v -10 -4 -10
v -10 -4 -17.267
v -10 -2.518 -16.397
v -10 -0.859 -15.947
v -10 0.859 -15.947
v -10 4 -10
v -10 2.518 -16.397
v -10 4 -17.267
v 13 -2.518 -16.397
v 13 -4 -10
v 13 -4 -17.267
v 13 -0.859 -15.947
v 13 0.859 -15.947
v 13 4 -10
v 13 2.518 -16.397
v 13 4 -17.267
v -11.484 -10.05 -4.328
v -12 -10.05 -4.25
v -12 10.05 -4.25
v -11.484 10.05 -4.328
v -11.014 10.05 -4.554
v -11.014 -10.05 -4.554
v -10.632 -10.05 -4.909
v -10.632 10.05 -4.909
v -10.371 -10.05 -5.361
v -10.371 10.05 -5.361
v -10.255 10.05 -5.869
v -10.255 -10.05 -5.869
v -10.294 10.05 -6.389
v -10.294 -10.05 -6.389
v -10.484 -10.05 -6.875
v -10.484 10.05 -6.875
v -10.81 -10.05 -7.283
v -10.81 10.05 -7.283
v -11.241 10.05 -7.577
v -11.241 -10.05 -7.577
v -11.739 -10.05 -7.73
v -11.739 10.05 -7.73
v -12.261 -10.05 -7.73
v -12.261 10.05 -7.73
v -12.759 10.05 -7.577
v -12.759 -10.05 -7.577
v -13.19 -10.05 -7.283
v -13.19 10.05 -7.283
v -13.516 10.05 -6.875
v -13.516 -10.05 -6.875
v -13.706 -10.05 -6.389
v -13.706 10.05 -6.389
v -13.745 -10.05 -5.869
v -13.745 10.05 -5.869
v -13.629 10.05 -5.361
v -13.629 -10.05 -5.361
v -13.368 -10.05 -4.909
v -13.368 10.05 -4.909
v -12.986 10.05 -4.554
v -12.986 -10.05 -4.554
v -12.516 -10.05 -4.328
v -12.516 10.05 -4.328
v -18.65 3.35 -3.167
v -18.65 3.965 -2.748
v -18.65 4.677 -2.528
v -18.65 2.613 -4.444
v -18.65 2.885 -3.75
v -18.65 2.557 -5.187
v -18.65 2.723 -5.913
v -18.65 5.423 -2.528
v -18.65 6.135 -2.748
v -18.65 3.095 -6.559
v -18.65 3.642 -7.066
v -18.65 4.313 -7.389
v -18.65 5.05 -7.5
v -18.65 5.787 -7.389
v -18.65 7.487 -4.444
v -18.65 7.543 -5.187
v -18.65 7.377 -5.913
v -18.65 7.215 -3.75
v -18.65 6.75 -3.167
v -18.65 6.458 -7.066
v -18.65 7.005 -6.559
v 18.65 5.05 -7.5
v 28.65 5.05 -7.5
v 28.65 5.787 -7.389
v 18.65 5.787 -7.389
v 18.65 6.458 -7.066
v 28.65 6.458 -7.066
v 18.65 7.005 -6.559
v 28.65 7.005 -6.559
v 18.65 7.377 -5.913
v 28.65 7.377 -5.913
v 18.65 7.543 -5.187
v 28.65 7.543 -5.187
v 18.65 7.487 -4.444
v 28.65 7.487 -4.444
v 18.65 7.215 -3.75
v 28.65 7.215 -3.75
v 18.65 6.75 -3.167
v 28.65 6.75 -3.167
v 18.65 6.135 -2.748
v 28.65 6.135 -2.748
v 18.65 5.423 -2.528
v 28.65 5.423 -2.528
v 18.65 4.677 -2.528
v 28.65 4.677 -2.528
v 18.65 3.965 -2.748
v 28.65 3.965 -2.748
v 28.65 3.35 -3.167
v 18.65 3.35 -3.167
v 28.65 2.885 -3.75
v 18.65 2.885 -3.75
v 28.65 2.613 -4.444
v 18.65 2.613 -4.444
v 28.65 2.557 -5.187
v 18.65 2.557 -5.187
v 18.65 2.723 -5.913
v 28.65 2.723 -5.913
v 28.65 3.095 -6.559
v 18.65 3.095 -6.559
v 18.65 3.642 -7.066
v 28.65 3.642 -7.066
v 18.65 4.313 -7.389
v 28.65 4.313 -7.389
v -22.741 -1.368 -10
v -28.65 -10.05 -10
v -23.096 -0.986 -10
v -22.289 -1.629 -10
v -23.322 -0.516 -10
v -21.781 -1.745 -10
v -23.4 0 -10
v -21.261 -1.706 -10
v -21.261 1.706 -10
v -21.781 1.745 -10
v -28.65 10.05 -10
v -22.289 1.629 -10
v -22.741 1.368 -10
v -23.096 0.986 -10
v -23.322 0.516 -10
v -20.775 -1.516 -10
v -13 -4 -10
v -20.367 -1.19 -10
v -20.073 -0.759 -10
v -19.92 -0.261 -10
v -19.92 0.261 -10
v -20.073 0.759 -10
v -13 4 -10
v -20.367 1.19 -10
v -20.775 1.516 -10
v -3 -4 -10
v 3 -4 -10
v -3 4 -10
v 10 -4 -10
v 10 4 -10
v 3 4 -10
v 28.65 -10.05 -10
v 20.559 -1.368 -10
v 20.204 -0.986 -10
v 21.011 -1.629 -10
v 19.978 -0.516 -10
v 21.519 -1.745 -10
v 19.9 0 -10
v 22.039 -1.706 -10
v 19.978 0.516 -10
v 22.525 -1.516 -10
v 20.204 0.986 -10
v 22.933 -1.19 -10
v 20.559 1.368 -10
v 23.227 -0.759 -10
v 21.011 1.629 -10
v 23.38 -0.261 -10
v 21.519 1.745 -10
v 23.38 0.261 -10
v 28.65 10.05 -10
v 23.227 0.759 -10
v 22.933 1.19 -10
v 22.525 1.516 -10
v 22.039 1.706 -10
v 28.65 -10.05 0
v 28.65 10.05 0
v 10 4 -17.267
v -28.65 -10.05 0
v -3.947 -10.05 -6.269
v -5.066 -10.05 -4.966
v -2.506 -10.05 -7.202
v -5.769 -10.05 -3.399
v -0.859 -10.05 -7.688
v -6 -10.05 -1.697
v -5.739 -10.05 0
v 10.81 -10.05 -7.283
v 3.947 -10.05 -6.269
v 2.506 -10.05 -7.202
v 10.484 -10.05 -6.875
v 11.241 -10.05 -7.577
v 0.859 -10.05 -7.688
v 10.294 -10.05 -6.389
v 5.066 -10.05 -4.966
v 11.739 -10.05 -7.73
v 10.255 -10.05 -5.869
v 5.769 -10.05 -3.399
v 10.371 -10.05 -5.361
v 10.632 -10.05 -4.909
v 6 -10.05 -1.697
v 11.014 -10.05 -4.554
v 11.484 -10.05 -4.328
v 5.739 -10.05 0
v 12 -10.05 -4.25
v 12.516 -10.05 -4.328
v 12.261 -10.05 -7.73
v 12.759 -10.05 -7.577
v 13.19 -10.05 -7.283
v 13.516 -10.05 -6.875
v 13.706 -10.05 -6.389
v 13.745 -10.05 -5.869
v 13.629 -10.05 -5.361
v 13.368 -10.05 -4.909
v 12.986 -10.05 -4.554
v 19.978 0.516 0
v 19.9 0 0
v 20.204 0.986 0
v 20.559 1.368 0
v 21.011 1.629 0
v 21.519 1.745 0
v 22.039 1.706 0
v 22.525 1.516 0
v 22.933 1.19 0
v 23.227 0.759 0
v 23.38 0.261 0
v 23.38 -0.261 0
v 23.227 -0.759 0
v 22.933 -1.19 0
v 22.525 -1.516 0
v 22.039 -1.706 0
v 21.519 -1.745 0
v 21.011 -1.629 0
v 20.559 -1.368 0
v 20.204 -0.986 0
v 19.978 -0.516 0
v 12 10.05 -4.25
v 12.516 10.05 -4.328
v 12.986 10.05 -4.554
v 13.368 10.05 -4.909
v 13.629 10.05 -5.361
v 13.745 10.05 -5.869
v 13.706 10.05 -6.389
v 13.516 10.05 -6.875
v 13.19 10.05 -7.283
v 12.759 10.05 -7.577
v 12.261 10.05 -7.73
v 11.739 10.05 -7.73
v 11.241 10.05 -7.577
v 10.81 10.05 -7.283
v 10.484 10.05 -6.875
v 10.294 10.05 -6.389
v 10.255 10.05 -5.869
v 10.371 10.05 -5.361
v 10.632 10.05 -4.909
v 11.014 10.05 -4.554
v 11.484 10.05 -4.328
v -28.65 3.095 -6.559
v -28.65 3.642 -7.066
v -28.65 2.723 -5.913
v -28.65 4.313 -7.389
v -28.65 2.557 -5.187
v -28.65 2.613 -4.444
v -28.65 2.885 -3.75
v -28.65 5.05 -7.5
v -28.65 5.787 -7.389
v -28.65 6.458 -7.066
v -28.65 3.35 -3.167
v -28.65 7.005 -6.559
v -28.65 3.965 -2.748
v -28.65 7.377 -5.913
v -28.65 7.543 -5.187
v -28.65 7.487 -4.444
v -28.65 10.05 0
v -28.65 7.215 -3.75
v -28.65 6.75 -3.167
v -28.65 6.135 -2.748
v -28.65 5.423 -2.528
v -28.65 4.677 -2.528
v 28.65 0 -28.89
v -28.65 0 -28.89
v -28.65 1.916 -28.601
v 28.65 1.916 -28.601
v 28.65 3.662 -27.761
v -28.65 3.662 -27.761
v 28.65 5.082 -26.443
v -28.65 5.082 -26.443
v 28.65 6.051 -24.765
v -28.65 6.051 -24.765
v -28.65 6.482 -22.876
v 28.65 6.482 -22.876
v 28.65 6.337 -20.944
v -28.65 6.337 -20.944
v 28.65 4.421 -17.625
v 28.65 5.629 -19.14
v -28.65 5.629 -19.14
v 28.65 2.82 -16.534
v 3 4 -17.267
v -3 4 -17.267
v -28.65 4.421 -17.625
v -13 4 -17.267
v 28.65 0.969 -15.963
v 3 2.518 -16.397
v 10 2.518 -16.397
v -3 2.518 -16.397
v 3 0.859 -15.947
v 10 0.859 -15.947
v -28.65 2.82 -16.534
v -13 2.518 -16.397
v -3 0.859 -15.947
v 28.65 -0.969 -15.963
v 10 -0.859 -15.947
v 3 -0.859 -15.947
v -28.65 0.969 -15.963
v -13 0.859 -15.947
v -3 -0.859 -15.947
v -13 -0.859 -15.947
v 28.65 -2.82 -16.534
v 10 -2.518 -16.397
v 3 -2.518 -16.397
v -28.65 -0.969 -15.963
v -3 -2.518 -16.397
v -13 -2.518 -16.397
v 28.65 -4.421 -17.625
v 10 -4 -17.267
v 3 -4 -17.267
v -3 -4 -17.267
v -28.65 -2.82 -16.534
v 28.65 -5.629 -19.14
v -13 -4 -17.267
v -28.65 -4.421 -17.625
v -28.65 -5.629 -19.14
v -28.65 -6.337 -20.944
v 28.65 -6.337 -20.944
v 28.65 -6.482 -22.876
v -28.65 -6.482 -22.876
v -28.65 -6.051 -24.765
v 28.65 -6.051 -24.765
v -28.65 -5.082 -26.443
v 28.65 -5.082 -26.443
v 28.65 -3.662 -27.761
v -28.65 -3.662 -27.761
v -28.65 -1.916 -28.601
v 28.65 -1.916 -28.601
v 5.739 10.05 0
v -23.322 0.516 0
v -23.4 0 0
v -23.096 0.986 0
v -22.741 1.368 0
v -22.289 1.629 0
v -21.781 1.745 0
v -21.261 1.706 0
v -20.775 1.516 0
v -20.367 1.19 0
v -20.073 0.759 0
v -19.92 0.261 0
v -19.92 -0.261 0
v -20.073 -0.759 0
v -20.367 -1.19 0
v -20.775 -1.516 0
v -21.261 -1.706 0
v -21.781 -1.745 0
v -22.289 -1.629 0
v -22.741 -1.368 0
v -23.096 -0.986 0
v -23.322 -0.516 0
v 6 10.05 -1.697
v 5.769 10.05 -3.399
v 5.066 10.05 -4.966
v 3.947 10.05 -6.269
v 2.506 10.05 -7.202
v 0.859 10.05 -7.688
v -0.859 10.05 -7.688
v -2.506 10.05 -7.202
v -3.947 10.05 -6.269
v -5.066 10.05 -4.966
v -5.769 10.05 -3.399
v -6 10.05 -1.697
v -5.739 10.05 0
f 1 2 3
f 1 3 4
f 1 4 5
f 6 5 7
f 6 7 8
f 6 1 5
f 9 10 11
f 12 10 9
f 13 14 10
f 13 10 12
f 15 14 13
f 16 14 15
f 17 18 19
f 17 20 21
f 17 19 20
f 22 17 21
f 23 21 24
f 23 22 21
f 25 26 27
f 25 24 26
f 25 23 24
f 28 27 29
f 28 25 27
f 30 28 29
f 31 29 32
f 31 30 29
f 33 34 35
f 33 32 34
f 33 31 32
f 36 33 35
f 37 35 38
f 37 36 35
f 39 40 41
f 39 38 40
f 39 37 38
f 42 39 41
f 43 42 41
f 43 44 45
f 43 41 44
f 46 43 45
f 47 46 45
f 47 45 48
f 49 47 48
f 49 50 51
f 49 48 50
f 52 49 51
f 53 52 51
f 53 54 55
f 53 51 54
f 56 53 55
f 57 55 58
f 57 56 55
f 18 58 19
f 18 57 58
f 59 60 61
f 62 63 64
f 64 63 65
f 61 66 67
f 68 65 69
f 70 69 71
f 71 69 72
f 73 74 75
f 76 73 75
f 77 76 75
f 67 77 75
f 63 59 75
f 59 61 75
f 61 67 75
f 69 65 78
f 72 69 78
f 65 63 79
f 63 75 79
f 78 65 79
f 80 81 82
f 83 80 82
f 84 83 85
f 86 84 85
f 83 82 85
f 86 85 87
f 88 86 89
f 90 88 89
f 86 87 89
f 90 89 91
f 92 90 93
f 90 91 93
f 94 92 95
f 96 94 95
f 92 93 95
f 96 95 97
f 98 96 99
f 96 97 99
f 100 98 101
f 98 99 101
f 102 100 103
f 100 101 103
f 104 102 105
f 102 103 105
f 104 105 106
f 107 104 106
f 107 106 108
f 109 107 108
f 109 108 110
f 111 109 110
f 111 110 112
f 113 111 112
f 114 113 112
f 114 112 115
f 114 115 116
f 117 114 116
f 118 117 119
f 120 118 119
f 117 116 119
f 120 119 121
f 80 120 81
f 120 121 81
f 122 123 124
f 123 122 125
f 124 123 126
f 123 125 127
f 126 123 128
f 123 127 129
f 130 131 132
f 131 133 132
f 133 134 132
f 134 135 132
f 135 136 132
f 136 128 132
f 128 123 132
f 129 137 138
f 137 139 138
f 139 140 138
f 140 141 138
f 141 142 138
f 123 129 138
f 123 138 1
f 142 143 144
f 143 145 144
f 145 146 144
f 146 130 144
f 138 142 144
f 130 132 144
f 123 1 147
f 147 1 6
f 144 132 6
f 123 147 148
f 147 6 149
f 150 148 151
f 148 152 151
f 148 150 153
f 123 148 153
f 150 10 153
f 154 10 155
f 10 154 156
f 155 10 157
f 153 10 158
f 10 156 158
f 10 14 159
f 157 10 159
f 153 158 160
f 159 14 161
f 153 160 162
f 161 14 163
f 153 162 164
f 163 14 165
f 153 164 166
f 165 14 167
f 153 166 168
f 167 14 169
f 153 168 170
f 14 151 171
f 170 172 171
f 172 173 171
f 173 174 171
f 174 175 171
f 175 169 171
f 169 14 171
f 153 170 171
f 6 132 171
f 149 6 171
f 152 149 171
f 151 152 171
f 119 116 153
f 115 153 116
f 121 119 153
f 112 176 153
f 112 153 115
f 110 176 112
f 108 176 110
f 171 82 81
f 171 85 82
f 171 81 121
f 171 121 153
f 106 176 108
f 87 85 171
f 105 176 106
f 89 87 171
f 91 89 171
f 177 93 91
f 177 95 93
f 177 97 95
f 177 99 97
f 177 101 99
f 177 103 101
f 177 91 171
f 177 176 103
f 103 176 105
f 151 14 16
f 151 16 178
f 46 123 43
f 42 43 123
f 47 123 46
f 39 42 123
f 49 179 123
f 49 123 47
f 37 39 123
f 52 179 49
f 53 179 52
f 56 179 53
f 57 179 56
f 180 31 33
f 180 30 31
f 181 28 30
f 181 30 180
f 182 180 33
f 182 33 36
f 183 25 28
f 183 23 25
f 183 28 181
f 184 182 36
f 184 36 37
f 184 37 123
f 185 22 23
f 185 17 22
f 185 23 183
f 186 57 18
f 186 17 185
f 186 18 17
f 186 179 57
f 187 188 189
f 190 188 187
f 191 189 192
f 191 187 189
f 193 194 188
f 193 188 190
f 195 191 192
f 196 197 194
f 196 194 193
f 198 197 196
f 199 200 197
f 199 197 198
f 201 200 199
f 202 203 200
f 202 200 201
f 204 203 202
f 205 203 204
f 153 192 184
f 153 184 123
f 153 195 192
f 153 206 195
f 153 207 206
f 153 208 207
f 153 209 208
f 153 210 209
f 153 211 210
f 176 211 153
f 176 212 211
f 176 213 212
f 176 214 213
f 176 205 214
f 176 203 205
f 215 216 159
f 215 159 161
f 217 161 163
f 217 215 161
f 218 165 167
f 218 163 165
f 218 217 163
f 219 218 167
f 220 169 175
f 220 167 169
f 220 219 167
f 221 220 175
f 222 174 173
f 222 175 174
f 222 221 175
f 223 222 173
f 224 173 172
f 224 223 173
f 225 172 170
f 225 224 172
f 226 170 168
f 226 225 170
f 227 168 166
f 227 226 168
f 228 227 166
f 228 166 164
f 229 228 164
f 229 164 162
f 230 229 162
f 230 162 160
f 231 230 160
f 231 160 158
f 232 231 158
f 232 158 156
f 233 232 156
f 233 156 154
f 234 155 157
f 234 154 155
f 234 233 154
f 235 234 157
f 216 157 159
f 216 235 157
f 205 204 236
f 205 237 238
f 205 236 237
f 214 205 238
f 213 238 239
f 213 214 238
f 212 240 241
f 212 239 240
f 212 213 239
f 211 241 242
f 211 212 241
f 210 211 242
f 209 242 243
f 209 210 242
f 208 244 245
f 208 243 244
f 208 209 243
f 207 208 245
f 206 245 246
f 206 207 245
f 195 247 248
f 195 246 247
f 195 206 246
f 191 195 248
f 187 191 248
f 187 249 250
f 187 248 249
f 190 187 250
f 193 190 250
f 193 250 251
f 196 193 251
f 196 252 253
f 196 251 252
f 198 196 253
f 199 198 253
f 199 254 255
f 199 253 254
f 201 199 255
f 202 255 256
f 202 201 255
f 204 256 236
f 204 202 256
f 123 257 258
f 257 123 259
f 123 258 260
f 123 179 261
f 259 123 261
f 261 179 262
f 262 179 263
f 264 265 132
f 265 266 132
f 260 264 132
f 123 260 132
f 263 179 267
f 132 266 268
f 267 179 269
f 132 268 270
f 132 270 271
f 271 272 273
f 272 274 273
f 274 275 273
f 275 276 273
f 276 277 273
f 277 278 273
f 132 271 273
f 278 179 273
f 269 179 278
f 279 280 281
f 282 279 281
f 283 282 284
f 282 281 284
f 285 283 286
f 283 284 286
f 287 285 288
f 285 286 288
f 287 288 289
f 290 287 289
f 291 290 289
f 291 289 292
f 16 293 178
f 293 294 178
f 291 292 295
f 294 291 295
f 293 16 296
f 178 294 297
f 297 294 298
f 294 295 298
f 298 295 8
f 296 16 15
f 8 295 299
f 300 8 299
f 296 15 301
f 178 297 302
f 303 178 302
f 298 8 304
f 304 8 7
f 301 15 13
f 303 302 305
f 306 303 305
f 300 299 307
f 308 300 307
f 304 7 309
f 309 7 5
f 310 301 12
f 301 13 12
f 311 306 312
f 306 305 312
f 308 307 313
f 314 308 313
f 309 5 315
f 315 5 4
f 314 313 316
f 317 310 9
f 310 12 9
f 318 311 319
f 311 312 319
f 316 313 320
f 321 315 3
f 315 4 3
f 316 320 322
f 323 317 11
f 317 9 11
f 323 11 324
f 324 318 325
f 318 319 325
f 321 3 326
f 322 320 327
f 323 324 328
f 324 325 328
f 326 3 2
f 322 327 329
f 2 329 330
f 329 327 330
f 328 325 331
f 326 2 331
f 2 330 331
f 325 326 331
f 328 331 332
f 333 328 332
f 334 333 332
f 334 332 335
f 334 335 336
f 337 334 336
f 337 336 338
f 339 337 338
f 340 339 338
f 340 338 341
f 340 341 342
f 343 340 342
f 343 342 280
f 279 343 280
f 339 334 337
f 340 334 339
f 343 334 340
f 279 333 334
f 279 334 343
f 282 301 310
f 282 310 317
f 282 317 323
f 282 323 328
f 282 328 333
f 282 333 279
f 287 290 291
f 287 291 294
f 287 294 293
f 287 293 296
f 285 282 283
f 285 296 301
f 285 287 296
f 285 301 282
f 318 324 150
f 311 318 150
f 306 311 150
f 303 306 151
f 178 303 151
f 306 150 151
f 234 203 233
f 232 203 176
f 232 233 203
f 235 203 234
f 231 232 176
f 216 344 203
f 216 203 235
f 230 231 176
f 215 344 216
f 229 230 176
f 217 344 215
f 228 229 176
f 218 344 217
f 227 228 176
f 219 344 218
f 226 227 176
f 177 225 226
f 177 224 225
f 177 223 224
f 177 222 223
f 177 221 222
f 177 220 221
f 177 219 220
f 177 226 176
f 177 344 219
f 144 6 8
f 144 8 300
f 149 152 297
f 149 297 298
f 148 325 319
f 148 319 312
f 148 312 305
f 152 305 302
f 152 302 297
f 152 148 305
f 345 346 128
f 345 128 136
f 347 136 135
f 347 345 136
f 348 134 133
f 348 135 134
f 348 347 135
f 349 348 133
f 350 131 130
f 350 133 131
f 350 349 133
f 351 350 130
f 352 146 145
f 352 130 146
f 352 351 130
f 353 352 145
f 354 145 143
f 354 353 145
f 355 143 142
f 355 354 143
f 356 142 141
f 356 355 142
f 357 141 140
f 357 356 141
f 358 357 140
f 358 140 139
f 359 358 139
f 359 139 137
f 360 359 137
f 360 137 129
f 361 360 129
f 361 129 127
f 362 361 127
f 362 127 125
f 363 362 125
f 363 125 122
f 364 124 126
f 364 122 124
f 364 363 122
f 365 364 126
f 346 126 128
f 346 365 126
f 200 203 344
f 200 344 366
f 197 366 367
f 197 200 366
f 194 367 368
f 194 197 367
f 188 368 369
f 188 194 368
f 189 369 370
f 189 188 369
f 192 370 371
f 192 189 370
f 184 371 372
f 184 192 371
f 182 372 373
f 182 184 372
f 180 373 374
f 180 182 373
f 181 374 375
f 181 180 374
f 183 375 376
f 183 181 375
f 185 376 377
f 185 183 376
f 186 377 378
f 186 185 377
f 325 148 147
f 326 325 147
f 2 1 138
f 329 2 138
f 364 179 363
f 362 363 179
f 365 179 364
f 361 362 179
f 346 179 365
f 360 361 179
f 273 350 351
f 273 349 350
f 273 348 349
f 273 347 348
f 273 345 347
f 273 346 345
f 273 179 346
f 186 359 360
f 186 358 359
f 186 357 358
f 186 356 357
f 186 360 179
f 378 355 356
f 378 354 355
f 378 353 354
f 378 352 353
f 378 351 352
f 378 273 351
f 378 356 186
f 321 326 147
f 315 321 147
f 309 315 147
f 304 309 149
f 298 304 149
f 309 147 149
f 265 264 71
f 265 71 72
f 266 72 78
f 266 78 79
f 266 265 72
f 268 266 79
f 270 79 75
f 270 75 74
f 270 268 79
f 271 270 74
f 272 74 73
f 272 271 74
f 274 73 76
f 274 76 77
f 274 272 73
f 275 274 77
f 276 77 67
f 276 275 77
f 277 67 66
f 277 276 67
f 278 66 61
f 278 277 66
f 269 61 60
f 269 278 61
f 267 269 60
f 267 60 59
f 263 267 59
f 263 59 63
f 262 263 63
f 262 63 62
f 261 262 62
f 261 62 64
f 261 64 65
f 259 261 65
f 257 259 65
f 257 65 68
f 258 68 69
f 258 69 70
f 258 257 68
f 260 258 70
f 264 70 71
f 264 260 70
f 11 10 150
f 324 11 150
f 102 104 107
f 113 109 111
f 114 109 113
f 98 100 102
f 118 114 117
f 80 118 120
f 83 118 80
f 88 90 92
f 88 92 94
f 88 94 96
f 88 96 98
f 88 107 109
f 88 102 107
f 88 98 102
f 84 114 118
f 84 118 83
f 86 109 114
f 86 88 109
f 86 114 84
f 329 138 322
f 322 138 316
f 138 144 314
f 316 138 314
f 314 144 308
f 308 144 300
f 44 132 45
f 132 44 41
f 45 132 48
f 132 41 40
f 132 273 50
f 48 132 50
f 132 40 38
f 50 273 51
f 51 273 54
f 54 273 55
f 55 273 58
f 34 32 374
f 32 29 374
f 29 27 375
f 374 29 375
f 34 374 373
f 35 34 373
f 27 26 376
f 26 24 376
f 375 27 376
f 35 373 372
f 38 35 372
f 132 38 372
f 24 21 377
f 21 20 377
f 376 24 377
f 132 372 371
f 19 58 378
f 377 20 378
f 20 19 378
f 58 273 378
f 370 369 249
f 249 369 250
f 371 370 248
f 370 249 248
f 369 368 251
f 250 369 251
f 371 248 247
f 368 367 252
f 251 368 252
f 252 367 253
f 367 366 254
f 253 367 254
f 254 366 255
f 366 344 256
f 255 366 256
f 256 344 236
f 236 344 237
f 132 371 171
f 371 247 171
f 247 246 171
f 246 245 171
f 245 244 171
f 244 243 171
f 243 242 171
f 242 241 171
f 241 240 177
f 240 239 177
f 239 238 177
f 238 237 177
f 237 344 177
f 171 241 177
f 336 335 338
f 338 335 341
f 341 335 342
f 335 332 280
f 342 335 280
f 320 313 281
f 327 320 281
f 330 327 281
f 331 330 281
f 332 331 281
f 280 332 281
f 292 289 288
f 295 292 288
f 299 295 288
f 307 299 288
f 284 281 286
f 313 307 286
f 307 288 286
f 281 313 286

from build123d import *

# Parameters (mm, degrees)
SKETCH1_W                = 57.3
SKETCH1_H                = 20.1
BOSS_EXTRUDE1_DEPTH      = 10
SKETCH2_W                = 3
SKETCH2_H                = 8
SKETCH2_W_2              = 6
BOSS_EXTRUDE2_DEPTH      = 20
SKETCH3_R                = 2.5
SKETCH3_R_2              = 1.75
BOSS_EXTRUDE3_DEPTH      = 4
BOSS_EXTRUDE4_START      = -9
SKETCH3_3_R              = 2.5
SKETCH3_3_R_2            = 1.75
BOSS_EXTRUDE4_DEPTH      = 8
CUT_EXTRUDE1_DEPTH       = 53.304158534
CUT_EXTRUDE1_DEPTH_BACK  = 53.304158534
SKETCH3_4_R              = 1.75
CUT_EXTRUDE2_DEPTH       = 35.503001319
CUT_EXTRUDE2_DEPTH_BACK  = 35.503001319
SKETCH4_R                = 1.75
CUT_EXTRUDE3_DEPTH       = 44.832232432
CUT_EXTRUDE3_DEPTH_BACK  = 44.832232432
SKETCH6_R                = 1.75
SKETCH6_R_2              = 6
SKETCH7_R                = 2.5
CUT_EXTRUDE4_DEPTH       = 10
BOSS_EXTRUDE6_DEPTH      = 15.65
BOSS_EXTRUDE6_DEPTH_BACK = 41.65
SKETCH5_R                = 6.5


with BuildPart() as part:
    # Sketch1 → Boss-Extrude1 (new body)
    with BuildSketch(Plane.XY):
        Rectangle(SKETCH1_W, SKETCH1_H)
    extrude(amount=-BOSS_EXTRUDE1_DEPTH)

    # Sketch2 → Boss-Extrude2 (add)
    with BuildSketch(Plane(origin=(0, 0, -10), x_dir=(-1, 0, 0), z_dir=(0, 0, -1))):
        with Locations((-11.5, 0)):
            Rectangle(SKETCH2_W, SKETCH2_H)
        Rectangle(SKETCH2_W_2, SKETCH2_H)
        with Locations((11.5, 0)):
            Rectangle(SKETCH2_W, SKETCH2_H)
    extrude(amount=BOSS_EXTRUDE2_DEPTH)

    # Sketch3 → Boss-Extrude3 (add)
    with BuildSketch(Plane(origin=(13, 0, 0), x_dir=(0, 0, -1), z_dir=(1, 0, 0))):
        with Locations((22.39, 0)):
            Circle(SKETCH3_R)
        with Locations((22.39, 0)):
            Circle(SKETCH3_R_2, mode=Mode.SUBTRACT)
    boss_extrude3 = extrude(amount=-BOSS_EXTRUDE3_DEPTH)

    # Sketch3<3> → Boss-Extrude4 (add)
    with BuildSketch(Plane(origin=(13, 0, 0), x_dir=(0, 0, -1), z_dir=(1, 0, 0)).offset(BOSS_EXTRUDE4_START)):
        with Locations((22.39, 0)):
            Circle(SKETCH3_3_R)
        with Locations((22.39, 0)):
            Circle(SKETCH3_3_R_2, mode=Mode.SUBTRACT)
    extrude(amount=-BOSS_EXTRUDE4_DEPTH)

    # Mirror1: Boss-Extrude3 across plane
    add(boss_extrude3.mirror(Plane(origin=(0, 0, 0), x_dir=(0, 0, 1), z_dir=(1, 0, 0))))

    # Sketch3<4> → Cut-Extrude1 (cut, two sides: drawn at the far end of the back side and taken through both)
    with BuildSketch(Plane(origin=(13, 0, 0), x_dir=(0, 0, -1), z_dir=(1, 0, 0)).offset(-CUT_EXTRUDE1_DEPTH_BACK)):
        with Locations((22.39, 0)):
            Circle(SKETCH3_4_R)
        with BuildLine():
            Line((30, 4), (22.39, 4))
            ThreePointArc((22.39, 4), (25.218427125, 2.828427125), (26.39, 0))
            ThreePointArc((26.39, 0), (25.218427125, -2.828427125), (22.39, -4))
            Line((22.39, -4), (30, -4))
            Line((30, -4), (30, 4))
        make_face()
    extrude(amount=CUT_EXTRUDE1_DEPTH + CUT_EXTRUDE1_DEPTH_BACK, mode=Mode.SUBTRACT)

    # Sketch4 → Cut-Extrude2 (cut, two sides: drawn at the far end of the back side and taken through both)
    with BuildSketch(Plane(origin=(0, 0, -10), x_dir=(-1, 0, 0), z_dir=(0, 0, -1)).offset(-CUT_EXTRUDE2_DEPTH_BACK)):
        with Locations((-21.65, 0)):
            Circle(SKETCH4_R)
        with Locations((21.65, 0)):
            Circle(SKETCH4_R)
    extrude(amount=CUT_EXTRUDE2_DEPTH + CUT_EXTRUDE2_DEPTH_BACK, mode=Mode.SUBTRACT)

    # Sketch6 → Cut-Extrude3 (cut, two sides: drawn at the far end of the back side and taken through both)
    with BuildSketch(Plane(origin=(0, 10.05, 0), x_dir=(1, 0, 0), z_dir=(0, 1, 0)).offset(-CUT_EXTRUDE3_DEPTH_BACK)):
        with Locations(Location((-12, 6, 0), (0, 0, 270))):
            Circle(SKETCH6_R)
        with Locations(Location((12, 6, 0), (0, 0, 270))):
            Circle(SKETCH6_R)
        with Locations((0, 1.75)):
            Circle(SKETCH6_R_2)
    extrude(amount=CUT_EXTRUDE3_DEPTH + CUT_EXTRUDE3_DEPTH_BACK, mode=Mode.SUBTRACT)

    # Sketch7 → Cut-Extrude4 (cut)
    with BuildSketch(Plane(origin=(28.65, 0, 0), x_dir=(0, 0, -1), z_dir=(1, 0, 0))):
        with Locations((5, 5.05)):
            Circle(SKETCH7_R)
    cut_extrude4 = extrude(amount=-CUT_EXTRUDE4_DEPTH, mode=Mode.SUBTRACT)

    # Mirror2: Cut-Extrude4 across plane
    add(cut_extrude4.mirror(Plane(origin=(0, 0, 0), x_dir=(0, 0, 1), z_dir=(1, 0, 0))), mode=Mode.SUBTRACT)

    # Sketch5 → Boss-Extrude6 (add, two sides: drawn at the far end of the back side and taken through both)
    with BuildSketch(Plane(origin=(13, 0, 0), x_dir=(0, 0, -1), z_dir=(1, 0, 0)).offset(-BOSS_EXTRUDE6_DEPTH_BACK)):
        with Locations((22.39, 0)):
            Circle(SKETCH5_R)
    extrude(amount=BOSS_EXTRUDE6_DEPTH + BOSS_EXTRUDE6_DEPTH_BACK)


solid = part.part
